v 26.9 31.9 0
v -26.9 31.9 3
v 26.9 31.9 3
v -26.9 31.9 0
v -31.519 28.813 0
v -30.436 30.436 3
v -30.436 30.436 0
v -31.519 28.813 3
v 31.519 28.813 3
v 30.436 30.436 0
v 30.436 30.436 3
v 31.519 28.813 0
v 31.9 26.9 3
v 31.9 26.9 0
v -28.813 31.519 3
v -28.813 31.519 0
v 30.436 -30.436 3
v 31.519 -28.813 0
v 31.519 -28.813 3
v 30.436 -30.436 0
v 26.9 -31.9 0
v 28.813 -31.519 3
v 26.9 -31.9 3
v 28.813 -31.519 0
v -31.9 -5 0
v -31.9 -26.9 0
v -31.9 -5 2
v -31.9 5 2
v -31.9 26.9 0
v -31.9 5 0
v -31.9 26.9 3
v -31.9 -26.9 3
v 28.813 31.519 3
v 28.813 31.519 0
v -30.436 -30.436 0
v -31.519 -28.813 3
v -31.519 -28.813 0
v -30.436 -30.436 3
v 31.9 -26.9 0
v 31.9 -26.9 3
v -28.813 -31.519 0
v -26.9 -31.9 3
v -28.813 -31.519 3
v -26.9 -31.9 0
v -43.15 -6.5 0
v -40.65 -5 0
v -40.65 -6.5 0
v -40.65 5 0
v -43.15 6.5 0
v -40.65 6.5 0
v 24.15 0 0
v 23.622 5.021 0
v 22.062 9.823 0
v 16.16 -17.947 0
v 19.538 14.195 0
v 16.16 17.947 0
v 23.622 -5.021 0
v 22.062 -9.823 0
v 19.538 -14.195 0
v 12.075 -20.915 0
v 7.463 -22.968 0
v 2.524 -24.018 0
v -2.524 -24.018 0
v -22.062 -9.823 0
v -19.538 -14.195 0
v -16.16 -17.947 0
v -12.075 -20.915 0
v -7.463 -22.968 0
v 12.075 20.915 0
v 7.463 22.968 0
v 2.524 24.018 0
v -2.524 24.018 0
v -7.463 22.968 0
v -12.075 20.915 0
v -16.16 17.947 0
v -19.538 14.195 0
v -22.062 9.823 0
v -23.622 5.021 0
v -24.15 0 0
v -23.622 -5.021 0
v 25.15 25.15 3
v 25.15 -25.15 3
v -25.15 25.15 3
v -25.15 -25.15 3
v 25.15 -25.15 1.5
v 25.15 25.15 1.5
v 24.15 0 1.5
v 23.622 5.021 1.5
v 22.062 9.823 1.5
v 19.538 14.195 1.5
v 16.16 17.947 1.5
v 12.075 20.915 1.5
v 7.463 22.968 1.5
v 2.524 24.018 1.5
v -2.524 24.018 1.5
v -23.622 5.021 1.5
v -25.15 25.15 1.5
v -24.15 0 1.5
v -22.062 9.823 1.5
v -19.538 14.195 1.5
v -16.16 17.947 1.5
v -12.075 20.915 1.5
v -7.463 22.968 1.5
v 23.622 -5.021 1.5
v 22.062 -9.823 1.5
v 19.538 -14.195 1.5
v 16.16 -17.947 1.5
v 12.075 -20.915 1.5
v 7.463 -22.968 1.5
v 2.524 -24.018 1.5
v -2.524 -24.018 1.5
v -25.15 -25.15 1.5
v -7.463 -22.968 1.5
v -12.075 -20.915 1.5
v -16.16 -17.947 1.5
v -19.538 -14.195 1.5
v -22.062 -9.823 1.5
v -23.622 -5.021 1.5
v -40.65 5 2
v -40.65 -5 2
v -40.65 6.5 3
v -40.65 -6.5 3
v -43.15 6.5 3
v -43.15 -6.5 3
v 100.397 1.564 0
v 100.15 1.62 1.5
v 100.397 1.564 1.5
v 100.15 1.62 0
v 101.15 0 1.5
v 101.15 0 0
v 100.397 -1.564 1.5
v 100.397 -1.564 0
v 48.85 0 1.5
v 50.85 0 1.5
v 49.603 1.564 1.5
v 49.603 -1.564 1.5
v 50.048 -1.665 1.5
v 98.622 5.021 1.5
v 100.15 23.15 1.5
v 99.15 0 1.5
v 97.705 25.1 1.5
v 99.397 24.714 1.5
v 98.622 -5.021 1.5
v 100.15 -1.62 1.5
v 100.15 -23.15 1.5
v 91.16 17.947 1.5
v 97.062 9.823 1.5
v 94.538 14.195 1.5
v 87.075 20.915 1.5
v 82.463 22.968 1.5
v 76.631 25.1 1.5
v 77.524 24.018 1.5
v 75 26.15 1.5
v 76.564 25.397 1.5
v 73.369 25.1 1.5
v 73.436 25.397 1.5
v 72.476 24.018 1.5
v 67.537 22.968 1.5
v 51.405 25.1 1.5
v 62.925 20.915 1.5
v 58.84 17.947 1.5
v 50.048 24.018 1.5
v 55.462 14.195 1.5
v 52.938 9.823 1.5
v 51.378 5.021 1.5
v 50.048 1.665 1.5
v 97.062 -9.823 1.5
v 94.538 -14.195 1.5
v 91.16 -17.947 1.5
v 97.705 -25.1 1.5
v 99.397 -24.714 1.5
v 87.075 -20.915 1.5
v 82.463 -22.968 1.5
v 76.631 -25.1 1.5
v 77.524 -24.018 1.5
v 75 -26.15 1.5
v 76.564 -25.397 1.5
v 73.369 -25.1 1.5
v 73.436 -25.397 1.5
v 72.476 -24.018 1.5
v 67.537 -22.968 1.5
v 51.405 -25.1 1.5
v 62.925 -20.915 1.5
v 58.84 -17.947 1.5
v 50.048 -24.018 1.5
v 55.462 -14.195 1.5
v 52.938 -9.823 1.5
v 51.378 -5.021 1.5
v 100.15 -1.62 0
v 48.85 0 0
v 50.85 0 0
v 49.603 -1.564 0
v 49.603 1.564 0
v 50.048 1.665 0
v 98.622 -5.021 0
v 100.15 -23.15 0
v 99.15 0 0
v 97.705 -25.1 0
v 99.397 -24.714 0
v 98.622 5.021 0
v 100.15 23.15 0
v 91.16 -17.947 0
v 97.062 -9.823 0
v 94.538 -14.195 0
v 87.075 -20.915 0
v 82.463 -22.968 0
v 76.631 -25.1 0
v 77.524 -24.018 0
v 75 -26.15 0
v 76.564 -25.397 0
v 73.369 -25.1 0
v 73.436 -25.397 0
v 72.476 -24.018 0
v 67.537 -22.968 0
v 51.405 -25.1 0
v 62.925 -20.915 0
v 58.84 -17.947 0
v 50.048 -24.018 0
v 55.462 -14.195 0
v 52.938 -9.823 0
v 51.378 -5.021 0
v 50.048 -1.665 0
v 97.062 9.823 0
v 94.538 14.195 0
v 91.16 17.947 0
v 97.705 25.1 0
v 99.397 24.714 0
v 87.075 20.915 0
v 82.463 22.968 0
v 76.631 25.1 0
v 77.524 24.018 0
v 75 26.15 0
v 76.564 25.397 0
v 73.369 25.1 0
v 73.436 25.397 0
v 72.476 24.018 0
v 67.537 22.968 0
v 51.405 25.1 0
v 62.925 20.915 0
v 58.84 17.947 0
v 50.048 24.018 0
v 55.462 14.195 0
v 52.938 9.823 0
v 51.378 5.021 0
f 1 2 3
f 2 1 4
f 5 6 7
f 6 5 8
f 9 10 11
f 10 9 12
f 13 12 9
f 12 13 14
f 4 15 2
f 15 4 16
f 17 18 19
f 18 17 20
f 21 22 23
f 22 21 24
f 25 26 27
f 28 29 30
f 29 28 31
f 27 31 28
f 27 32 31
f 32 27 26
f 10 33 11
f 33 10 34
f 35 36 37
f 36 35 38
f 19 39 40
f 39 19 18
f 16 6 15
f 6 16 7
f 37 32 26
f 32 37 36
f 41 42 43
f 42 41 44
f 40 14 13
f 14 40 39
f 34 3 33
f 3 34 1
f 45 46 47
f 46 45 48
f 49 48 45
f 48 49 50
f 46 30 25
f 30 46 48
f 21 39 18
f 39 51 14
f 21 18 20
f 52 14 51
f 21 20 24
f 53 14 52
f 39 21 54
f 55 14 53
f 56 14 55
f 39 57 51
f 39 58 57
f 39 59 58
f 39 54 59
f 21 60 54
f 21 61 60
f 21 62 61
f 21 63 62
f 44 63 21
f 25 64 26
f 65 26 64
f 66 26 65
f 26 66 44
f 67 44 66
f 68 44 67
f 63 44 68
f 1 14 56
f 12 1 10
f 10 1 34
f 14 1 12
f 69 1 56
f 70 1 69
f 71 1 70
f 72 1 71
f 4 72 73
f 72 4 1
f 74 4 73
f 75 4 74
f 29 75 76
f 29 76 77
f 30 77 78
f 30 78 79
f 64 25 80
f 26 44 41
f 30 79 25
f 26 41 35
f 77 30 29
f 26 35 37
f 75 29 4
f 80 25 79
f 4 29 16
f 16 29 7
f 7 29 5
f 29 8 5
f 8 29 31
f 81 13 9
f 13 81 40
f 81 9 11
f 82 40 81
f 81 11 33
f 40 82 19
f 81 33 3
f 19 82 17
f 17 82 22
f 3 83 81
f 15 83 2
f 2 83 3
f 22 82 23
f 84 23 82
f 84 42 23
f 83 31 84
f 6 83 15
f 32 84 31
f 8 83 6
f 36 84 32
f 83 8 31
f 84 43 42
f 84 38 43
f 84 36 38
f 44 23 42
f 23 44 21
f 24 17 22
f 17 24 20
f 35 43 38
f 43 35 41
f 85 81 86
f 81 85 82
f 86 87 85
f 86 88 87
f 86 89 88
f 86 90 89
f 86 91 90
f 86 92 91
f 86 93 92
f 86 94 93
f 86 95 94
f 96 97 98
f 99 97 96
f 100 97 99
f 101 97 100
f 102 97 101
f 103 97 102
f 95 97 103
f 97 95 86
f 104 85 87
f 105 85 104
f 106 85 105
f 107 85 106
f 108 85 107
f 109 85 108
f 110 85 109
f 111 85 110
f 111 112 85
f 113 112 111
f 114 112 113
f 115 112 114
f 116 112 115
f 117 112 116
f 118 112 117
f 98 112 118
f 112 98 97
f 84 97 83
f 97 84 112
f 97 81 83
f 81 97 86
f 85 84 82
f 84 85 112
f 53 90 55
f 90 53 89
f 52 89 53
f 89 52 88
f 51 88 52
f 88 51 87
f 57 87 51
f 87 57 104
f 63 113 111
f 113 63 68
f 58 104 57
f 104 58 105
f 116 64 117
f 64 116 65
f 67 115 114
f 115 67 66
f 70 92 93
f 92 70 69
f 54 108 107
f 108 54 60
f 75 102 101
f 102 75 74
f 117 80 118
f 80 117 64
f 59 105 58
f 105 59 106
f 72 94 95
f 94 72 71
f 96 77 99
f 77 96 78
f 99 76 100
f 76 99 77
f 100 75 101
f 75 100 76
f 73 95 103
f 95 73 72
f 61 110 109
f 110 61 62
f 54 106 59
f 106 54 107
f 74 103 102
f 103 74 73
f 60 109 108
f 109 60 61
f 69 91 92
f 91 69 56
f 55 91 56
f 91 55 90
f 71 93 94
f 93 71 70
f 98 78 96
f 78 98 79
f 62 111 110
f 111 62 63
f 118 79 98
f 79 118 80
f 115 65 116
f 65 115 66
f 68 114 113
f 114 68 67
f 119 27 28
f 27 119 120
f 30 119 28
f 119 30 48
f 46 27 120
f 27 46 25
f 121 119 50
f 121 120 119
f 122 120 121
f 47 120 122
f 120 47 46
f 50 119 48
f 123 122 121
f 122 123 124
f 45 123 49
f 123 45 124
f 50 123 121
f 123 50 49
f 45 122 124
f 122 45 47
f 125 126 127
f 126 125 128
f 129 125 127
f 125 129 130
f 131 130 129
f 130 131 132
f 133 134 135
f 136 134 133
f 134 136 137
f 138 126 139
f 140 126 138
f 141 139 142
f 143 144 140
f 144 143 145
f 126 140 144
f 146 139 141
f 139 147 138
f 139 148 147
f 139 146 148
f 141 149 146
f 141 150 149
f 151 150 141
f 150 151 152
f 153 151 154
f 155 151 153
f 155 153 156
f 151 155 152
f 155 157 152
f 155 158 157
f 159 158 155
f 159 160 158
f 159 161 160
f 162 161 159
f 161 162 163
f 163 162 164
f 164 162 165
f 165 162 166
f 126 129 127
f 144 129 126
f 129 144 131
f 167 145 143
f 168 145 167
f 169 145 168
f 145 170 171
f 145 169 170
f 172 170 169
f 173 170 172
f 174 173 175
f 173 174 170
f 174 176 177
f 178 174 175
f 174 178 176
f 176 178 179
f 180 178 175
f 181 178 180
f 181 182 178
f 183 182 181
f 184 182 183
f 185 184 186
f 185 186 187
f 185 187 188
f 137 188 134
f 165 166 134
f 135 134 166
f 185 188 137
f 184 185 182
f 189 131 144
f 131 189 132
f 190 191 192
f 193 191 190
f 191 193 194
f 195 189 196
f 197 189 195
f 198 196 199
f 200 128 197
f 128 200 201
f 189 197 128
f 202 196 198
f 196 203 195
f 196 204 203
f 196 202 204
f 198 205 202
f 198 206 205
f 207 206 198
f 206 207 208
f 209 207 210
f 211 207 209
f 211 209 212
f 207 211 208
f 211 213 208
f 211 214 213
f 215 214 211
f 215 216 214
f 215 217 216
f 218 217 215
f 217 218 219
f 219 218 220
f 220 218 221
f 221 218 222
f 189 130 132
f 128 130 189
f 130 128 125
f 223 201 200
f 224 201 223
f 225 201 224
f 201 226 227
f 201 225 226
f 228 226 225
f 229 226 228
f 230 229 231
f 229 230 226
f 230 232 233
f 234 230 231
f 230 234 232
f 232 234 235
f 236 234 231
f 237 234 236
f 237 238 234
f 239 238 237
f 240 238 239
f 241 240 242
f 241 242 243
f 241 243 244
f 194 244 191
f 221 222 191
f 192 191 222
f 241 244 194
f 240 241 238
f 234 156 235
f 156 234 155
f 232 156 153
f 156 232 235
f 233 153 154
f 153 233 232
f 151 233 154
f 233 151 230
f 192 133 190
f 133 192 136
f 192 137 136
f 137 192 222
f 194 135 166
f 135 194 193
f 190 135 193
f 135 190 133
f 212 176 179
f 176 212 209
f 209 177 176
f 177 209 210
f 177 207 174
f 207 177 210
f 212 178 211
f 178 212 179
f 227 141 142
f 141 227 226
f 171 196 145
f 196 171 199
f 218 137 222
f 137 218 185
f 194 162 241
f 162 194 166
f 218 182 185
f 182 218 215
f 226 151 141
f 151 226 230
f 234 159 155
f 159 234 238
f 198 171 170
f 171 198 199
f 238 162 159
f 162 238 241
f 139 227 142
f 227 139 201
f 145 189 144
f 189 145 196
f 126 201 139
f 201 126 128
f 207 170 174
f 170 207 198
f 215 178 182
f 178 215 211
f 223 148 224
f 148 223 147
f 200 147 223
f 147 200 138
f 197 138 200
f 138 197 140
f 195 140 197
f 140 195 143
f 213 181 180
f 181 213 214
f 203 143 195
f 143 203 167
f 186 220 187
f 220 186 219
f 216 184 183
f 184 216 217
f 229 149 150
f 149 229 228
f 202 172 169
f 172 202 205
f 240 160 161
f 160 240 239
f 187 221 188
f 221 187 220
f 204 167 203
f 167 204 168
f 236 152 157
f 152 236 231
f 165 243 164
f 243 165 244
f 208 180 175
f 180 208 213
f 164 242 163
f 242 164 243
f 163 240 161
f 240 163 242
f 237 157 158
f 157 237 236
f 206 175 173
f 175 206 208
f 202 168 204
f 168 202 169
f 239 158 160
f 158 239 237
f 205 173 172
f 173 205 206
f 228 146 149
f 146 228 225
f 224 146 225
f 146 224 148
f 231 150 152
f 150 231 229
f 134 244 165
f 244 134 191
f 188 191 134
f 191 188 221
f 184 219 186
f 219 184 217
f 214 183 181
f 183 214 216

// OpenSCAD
use <lib.scad>

module trayOuter(
  width,
  depth,
  height=3,
  cornerRadius=5,
) {
    translate([((width-(2*cornerRadius)) * -0.5),((depth-(2*cornerRadius)) * -0.5),0]){
      minkowski(){
        cube([(width-(2*cornerRadius)),(depth-(2*cornerRadius)),(height/2)]);
        cylinder(r=cornerRadius,h=(height/2));
    }
  }
}

module trayInner(
  width,
  height=1.5,
  cornerRadius=2,
) {
    translate([((width-(2*cornerRadius)) * -0.5),((width-(2*cornerRadius)) * -0.5),0]){
      minkowski(){
        cube([(width-(2*cornerRadius)),(width-(2*cornerRadius)),(height/2)]);
        cylinder(r=cornerRadius,h=(height/2));
      }
    }
}

module trayInsert(
  width,
  height=1.5,
  filterSize,
  cornerRadius=2,
  fudge=1,
) {
    difference(){
      union(){       
        trayInner(width,height,cornerRadius);
        for (i = [0, 90, 180, 270]){
          rotate([0, 0, i]){
            translate([(width/2 - 1),0,(height/2)]){
              cylinder(h=height,r=2,center=true);
            };
          };
        };            
      };
      cylinder(h=(height*2.2),r=(filterSize/2 - 1),center=true);
    };
};


module filterHolder(
  width,
  depth,
  height=3,
  base=1.5,
  filterSize
) {
  union(){
      // tray
      difference(){
        difference(){
          // tray outer
          trayOuter(width=width,depth=depth,height=height);
          // tray inner void
          #translate([0,0,(height - base)]){
            trayInner(width=filterSize,height=(height+1),cornerRadius=0);
          };
        };
        // central hole
        cylinder(h=10,r=(filterSize/2 - 1),center=true);
      }

      // handle
      translate([(-width/2 - 5),0,1]){
          union(){
              //stem
              cube([11,10,2],center=true);
              //handle
              translate([-5,0,(2-(height/2))]){
                  cube([2.5,13,height],center=true);
              }
          }
      }
  }
};


filterHolder(
  width=63.8,
  depth=63.8,
  height=3,
  filterSize=50.3
);

translate([75,0,0]){
  trayInsert(
    width=50.3,
    height=1.5,
    filterSize=50.3
  );
};
